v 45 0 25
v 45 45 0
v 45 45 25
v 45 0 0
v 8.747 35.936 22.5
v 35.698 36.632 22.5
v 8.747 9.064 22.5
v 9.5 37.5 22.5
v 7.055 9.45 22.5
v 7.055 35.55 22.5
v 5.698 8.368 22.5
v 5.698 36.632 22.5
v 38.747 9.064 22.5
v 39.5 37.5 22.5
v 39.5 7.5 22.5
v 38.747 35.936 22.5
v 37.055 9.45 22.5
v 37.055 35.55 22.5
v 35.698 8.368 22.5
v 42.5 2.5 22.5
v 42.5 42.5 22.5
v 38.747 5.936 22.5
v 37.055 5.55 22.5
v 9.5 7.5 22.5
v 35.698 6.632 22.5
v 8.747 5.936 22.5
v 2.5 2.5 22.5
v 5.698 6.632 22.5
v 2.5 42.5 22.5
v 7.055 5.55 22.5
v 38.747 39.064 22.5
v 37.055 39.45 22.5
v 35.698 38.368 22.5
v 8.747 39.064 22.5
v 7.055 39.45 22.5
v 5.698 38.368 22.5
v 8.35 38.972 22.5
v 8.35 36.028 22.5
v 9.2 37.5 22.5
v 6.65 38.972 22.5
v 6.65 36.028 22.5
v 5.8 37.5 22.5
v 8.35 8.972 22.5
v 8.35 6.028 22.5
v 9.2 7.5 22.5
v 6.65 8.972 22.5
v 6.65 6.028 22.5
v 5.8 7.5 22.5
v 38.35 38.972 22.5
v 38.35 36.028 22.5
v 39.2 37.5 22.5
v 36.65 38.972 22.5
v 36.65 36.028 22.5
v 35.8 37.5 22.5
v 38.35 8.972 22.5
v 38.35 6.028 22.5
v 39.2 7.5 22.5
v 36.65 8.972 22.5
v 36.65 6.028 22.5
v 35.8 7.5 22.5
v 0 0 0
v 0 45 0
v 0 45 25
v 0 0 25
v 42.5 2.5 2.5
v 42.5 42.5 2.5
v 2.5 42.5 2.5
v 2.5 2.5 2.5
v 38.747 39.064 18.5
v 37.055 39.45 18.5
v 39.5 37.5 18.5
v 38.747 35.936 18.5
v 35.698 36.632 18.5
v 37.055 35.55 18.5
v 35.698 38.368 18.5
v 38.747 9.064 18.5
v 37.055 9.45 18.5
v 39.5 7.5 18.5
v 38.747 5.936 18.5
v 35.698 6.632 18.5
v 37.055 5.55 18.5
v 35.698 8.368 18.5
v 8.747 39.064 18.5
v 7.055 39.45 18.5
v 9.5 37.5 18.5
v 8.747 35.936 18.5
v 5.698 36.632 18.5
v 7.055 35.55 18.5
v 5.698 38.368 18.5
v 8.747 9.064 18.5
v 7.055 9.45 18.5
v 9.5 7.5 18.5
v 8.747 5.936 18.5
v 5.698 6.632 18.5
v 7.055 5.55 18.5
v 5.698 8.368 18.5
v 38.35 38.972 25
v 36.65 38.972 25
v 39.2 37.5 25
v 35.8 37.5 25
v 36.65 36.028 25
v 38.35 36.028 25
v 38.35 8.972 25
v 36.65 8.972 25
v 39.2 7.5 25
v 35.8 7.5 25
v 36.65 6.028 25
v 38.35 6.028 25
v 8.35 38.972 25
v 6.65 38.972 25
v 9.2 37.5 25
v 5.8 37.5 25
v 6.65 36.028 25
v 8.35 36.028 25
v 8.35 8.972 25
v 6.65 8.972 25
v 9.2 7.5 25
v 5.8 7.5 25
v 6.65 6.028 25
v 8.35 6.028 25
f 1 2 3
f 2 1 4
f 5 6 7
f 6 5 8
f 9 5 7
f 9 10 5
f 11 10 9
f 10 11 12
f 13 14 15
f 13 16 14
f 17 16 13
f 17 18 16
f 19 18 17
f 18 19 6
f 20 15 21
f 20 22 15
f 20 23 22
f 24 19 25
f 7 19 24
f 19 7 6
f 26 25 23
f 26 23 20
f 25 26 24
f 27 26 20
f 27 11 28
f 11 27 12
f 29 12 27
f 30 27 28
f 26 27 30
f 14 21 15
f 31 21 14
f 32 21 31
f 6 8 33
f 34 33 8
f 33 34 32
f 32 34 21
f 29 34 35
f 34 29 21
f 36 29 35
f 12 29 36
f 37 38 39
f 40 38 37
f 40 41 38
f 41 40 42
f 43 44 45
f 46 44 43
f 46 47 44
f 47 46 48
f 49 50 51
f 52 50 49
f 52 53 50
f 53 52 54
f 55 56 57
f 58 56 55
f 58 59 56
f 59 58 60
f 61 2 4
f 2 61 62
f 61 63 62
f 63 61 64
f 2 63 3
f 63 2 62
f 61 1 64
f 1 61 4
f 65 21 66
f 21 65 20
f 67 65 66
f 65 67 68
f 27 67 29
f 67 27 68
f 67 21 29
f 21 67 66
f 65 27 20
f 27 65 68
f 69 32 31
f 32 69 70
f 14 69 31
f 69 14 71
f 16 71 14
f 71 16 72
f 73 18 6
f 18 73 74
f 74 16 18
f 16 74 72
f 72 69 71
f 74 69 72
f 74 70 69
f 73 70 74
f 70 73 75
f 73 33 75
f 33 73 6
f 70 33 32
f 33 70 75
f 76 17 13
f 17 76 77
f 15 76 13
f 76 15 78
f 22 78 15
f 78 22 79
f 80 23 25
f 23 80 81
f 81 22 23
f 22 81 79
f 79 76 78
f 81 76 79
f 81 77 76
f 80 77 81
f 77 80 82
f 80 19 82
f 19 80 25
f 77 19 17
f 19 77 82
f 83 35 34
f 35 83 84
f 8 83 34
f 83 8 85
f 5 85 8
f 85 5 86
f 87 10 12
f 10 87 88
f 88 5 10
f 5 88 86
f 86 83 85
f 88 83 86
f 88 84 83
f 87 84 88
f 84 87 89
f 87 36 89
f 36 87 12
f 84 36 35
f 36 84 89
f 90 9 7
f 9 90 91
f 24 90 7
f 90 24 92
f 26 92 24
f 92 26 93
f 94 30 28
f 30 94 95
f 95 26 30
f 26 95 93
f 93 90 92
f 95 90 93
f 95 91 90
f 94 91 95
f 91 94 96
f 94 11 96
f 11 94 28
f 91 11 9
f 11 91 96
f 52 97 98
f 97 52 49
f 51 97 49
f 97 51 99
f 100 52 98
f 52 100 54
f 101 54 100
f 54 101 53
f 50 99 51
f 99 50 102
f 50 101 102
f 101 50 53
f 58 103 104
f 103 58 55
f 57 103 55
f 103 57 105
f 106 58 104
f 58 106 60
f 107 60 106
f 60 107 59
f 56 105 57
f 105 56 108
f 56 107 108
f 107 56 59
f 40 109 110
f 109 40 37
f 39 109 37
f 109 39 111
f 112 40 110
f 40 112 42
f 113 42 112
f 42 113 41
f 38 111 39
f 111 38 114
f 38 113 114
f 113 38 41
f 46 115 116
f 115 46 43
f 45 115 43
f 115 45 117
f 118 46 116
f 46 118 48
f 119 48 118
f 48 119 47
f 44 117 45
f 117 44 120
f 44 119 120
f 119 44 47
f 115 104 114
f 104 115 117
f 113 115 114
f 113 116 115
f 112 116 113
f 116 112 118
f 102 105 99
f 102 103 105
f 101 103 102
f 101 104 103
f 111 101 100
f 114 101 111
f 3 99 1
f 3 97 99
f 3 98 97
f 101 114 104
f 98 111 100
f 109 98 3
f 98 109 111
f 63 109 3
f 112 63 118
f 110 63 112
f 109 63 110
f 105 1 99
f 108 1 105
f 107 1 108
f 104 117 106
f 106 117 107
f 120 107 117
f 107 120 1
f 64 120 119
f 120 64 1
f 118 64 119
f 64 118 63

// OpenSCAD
// Enclosure base and lid with M3 heat-set inserts
// BOM: MB-SHCS-M3-08 (qty 4), MB-HSI-M3 (qty 4)

base_x = 45;
base_y = 45;
base_z = 22.5;
wall = 2.5;

cav_x = 40;
cav_y = 40;
cav_z = 20;

lid_z = 2.5;

insert_hole_d = 4.0;  // M3 insert hole
clear_hole_d = 3.4;   // M3 screw clearance

// Corner hole positions (15mm offset from center)
r = 15;
cx = base_x / 2;
cy = base_y / 2;
holes = [
  [cx + r, cy + r],
  [cx + r, cy - r],
  [cx - r, cy + r],
  [cx - r, cy - r]
];

// BASE
difference() {
  cube([base_x, base_y, base_z]);
  // Cavity: 40 × 40 × 20 mm with 2.5 mm walls
  translate([wall, wall, wall])
    cube([cav_x, cav_y, cav_z]);
}

// Insert holes (4mm bore, 4mm deep)
for (h = holes) {
  translate([h[0], h[1], base_z - 4])
    cylinder(d=insert_hole_d, h=4);
}

// LID (positioned on top of base)
translate([0, 0, base_z]) {
  difference() {
    cube([base_x, base_y, lid_z]);
    // Clearance holes for M3 screws
    for (h = holes) {
      translate([h[0], h[1], lid_z / 2])
        cylinder(d=clear_hole_d, h=lid_z + 1, center=true);
    }
  }
}
